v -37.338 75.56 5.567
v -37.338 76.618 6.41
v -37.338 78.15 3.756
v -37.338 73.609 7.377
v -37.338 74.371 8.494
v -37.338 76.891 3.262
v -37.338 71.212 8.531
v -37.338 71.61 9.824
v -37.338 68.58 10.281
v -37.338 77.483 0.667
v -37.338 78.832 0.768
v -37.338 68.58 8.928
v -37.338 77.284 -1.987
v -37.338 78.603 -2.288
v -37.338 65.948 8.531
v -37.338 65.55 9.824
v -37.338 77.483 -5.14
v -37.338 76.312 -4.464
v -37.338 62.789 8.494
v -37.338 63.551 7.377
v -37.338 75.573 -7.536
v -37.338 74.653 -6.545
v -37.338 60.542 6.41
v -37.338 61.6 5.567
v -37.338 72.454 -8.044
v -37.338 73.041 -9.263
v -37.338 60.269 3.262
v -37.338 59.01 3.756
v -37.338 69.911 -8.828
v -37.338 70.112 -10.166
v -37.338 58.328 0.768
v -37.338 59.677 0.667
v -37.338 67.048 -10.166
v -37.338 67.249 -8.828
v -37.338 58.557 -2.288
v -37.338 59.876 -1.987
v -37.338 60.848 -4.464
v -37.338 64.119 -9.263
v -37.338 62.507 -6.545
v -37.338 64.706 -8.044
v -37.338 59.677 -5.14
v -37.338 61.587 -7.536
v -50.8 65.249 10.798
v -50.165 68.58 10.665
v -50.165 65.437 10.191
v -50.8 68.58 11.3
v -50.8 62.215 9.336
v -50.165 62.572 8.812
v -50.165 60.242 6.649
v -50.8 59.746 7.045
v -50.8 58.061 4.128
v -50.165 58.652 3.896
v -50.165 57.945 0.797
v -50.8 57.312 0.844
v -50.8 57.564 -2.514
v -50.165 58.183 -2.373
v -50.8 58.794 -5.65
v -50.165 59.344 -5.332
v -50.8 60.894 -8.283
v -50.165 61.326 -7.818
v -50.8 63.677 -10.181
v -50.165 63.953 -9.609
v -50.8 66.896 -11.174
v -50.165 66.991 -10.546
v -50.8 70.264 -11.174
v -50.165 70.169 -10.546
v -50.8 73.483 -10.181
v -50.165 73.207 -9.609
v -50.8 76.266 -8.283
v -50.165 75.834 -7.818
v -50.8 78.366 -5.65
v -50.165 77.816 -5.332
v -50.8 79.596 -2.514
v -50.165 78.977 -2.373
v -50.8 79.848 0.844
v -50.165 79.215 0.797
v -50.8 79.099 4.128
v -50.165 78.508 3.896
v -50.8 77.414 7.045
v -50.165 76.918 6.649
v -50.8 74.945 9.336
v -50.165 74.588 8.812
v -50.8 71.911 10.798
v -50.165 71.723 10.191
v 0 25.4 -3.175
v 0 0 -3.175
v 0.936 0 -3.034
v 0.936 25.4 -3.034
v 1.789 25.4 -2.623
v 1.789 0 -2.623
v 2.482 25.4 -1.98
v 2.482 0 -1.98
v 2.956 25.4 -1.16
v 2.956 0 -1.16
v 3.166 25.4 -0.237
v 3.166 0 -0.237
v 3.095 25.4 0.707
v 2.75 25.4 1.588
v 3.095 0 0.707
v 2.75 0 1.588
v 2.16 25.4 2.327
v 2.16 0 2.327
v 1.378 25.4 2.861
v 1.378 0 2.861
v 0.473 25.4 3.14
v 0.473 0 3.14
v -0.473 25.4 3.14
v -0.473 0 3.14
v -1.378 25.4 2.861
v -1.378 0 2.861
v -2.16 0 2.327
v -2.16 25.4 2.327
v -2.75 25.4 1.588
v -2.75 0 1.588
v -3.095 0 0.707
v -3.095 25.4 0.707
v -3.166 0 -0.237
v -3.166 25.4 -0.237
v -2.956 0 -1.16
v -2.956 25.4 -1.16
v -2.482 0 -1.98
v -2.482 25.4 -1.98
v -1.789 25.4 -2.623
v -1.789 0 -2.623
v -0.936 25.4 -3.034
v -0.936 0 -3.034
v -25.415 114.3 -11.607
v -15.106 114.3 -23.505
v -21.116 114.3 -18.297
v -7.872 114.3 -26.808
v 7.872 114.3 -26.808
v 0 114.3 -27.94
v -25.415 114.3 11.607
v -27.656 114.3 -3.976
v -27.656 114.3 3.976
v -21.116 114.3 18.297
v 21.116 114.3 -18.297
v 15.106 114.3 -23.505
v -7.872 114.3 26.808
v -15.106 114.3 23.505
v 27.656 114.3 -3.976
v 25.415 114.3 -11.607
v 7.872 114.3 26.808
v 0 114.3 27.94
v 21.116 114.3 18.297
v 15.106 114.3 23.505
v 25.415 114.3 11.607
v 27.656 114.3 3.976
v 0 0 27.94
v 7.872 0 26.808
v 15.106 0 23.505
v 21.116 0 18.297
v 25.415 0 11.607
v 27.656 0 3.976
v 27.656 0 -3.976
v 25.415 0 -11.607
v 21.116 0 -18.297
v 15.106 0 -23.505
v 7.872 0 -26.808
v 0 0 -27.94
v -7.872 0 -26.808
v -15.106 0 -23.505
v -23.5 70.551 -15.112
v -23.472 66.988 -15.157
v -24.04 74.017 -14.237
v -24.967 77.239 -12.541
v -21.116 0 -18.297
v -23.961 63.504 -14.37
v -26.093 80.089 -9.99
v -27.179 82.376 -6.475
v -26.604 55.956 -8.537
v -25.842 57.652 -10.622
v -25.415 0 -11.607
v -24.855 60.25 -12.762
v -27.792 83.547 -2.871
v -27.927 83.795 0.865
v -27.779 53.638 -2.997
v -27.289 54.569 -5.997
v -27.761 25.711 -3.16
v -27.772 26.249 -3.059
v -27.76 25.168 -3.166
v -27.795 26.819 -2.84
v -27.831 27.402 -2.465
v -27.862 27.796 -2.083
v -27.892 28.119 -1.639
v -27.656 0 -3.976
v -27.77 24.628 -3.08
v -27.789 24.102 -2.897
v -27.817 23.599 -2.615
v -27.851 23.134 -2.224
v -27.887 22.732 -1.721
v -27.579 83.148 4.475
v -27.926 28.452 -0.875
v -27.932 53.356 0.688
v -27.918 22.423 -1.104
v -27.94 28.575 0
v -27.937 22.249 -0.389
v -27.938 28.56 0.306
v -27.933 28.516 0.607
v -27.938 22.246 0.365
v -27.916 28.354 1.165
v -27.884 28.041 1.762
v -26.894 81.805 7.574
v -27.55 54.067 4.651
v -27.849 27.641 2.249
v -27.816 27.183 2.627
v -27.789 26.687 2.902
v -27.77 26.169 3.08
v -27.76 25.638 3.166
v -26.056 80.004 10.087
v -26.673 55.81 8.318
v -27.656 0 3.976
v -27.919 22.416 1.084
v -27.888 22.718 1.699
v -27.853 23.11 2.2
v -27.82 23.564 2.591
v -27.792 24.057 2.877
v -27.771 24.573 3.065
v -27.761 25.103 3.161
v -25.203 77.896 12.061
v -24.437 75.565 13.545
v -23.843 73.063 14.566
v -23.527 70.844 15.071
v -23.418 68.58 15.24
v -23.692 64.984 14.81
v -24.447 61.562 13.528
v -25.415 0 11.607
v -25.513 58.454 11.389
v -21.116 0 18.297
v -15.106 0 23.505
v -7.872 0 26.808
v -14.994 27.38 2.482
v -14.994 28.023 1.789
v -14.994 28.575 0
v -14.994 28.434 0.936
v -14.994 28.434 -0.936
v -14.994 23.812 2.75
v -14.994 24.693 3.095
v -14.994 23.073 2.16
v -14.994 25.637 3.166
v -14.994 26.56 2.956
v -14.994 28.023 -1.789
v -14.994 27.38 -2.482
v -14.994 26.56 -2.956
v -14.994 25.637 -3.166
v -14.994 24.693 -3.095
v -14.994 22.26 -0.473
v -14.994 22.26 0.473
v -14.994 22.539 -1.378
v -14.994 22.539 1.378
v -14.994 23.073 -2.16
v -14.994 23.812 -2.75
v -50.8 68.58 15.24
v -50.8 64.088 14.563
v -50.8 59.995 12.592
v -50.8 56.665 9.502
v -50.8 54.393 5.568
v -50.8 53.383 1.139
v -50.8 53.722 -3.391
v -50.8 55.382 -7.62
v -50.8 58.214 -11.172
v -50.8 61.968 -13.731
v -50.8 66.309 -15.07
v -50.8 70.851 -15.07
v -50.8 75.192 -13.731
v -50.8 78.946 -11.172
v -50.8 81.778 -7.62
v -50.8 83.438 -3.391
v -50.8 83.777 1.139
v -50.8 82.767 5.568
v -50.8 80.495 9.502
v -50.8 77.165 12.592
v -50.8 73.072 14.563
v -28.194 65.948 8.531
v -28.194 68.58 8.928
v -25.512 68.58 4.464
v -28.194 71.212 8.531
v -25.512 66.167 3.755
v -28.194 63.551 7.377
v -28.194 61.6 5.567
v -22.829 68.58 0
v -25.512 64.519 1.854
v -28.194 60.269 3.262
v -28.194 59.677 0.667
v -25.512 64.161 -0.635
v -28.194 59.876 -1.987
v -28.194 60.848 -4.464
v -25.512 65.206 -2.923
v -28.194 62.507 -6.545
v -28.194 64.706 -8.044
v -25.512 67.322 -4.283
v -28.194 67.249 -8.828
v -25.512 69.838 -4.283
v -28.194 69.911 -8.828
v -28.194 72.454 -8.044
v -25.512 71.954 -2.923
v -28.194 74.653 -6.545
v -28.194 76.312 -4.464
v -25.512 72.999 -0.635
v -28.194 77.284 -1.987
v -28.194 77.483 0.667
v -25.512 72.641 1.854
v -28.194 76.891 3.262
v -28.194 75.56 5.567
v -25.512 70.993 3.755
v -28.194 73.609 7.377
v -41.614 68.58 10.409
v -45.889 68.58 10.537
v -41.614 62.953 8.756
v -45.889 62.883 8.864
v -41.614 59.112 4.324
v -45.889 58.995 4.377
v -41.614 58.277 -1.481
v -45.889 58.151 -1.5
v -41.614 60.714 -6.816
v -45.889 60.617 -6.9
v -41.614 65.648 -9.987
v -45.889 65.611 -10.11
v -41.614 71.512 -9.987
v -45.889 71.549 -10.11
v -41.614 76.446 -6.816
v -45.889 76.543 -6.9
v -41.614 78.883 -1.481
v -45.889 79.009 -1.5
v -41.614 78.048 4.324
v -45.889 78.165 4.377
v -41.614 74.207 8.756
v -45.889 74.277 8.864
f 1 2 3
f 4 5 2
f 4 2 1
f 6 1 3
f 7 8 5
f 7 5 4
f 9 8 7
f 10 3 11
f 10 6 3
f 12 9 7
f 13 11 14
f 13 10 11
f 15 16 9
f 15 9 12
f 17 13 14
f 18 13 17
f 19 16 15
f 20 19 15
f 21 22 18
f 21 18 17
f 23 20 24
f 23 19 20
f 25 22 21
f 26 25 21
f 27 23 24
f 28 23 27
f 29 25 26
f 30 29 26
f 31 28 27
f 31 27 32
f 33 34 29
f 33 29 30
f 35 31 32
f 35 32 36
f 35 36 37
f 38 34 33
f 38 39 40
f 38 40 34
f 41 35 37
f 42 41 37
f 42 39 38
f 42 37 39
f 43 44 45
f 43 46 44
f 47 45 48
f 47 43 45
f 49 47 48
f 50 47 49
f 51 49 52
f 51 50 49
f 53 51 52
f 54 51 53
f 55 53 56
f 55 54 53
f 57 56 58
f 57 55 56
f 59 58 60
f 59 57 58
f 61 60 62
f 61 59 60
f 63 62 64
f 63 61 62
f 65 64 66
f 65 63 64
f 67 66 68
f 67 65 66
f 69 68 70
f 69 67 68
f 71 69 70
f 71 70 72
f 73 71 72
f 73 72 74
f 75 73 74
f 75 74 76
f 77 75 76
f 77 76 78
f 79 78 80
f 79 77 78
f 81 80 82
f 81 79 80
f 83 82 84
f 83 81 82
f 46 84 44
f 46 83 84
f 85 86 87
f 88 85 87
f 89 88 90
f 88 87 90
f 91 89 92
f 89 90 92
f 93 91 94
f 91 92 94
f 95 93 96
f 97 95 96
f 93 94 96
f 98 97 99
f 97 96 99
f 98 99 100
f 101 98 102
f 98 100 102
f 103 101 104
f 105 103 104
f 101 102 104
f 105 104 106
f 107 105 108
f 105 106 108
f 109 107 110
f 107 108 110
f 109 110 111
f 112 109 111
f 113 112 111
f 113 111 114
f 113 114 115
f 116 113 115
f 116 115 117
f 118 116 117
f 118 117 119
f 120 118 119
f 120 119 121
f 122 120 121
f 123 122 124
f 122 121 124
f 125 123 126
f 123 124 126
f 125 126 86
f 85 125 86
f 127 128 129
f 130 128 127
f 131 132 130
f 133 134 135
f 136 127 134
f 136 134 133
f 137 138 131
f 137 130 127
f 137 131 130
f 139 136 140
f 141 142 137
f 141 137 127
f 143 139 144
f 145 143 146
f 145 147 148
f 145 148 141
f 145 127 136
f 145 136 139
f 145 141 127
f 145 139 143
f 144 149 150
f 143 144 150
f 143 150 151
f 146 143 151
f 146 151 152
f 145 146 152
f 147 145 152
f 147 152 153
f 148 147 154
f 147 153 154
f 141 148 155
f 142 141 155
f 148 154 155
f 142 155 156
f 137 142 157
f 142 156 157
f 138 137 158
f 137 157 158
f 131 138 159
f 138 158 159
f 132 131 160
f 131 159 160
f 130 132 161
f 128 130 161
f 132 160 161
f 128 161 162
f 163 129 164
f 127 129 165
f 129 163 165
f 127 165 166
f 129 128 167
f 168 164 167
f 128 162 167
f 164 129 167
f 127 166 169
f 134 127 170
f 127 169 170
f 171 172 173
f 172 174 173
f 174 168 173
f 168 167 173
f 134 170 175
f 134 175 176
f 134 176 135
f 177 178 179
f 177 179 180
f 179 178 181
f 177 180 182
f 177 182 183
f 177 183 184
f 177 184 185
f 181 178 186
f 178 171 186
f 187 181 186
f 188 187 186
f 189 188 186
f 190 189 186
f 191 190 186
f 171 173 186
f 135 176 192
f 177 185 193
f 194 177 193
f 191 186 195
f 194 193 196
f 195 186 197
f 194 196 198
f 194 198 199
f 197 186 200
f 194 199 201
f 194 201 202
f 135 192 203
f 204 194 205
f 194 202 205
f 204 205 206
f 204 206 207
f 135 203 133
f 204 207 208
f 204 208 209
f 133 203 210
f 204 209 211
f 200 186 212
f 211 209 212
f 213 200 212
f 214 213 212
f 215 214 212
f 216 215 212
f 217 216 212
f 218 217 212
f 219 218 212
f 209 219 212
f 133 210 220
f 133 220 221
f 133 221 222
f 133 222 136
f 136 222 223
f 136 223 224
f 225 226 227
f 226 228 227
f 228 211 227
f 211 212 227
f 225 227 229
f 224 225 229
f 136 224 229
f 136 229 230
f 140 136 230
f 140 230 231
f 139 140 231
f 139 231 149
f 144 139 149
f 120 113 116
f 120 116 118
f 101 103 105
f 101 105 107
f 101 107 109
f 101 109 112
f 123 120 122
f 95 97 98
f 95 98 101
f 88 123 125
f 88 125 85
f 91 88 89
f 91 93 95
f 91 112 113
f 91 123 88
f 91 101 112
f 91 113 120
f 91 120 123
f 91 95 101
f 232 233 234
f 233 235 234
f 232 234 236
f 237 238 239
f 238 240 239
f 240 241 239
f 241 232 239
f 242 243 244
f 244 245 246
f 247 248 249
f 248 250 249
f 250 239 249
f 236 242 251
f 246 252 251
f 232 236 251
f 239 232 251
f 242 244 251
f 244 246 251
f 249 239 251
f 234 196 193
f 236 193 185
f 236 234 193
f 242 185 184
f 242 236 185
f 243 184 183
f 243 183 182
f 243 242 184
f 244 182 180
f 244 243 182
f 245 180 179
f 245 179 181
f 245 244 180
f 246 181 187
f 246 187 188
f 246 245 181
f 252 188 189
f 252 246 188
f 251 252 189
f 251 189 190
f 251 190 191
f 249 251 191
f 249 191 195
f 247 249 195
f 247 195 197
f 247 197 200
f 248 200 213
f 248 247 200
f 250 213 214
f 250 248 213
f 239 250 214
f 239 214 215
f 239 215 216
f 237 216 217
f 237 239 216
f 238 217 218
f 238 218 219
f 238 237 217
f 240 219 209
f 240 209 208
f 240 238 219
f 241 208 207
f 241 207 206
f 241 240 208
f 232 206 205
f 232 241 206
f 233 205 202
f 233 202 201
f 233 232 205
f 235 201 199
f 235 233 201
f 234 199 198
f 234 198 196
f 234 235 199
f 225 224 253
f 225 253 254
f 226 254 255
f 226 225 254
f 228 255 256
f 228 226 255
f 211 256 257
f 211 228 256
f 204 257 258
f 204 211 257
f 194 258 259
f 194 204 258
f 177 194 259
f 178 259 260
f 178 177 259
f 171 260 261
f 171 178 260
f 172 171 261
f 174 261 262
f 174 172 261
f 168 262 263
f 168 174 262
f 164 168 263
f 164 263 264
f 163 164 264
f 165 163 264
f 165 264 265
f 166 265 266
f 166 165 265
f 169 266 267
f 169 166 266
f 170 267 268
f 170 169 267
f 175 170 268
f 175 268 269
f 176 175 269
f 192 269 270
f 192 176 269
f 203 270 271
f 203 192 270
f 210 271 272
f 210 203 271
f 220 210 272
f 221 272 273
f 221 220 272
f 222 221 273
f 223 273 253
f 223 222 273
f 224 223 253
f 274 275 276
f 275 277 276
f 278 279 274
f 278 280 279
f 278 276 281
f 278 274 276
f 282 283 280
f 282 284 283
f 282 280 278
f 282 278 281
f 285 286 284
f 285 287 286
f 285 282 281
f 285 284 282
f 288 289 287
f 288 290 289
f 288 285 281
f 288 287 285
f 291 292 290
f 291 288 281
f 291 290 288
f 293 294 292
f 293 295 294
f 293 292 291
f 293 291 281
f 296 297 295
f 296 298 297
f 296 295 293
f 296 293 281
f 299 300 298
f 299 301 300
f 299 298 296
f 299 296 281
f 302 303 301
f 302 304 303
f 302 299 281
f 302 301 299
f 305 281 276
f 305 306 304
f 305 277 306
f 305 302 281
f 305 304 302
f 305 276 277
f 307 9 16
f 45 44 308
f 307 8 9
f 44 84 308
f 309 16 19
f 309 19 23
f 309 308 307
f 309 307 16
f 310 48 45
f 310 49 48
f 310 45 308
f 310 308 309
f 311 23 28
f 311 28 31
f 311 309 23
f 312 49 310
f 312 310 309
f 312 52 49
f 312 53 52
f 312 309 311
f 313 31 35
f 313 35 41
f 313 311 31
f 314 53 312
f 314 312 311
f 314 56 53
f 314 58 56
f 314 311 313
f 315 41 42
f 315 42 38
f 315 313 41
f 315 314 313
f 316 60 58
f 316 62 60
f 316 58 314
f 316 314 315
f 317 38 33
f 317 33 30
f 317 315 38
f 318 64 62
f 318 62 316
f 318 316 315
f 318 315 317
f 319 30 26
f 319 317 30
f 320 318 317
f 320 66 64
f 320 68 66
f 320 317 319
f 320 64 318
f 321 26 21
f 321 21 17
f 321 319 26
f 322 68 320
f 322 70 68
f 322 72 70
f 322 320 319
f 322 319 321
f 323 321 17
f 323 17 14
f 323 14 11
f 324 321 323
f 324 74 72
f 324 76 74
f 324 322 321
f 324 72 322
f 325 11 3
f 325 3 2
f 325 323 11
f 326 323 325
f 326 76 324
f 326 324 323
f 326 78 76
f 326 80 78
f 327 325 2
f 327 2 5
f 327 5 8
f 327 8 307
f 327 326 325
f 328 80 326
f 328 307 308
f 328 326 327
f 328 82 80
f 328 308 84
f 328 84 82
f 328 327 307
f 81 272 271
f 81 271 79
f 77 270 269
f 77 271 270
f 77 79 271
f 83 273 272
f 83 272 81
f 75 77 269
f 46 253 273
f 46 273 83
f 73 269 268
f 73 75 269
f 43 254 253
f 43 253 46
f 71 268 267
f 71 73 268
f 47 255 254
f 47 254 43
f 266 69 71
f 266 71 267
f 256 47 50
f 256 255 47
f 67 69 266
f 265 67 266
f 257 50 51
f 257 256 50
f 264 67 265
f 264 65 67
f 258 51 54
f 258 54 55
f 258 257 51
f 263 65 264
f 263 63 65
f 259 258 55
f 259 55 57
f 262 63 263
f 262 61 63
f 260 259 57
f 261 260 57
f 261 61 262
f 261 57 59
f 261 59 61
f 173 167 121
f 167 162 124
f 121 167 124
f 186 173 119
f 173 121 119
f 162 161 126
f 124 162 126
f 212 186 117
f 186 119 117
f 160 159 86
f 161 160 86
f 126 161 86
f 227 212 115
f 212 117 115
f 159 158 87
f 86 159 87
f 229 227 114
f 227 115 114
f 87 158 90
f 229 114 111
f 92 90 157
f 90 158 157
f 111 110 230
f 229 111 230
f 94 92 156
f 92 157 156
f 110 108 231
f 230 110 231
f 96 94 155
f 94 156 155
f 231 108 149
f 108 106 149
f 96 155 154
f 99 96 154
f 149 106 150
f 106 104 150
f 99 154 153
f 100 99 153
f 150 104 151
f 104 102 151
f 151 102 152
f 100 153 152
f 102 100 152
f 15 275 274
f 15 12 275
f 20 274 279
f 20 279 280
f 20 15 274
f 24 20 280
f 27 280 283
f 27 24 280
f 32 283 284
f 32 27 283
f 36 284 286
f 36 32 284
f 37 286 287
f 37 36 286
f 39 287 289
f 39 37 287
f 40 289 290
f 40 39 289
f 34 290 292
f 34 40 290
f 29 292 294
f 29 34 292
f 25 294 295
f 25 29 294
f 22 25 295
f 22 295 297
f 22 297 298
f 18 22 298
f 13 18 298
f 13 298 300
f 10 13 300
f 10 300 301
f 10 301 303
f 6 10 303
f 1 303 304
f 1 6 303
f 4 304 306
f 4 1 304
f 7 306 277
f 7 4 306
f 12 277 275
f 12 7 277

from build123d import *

# Parameters (mm, degrees)
SKETCH1_R           = 27.94
BOSS_EXTRUDE1_DEPTH = 114.3
SKETCH2_W           = 28.65102891
SKETCH2_H           = 3.175
SKETCH3_R           = 3.175
OUTLET_DEPTH        = 25.4
SKETCH4_W           = 50.8
SKETCH4_H           = 15.24


with BuildPart() as part:
    # Sketch1 → Boss-Extrude1 (new body)
    with BuildSketch(Plane(origin=(0, 0, 0), x_dir=(1, 0, 0), z_dir=(0, 1, 0))):
        with Locations(Location((0, 0, 0), (0, 0, 270))):
            Circle(SKETCH1_R)
    extrude(amount=BOSS_EXTRUDE1_DEPTH)

    # Sketch2 → inlet (revolve, cut)
    with BuildSketch(Plane.XY):
        with Locations((-29.319058082, 26.9875)):
            Rectangle(SKETCH2_W, SKETCH2_H)
    revolve(axis=Axis((-14.993543627, 25.4, 0), (-1, 0, 0)), mode=Mode.SUBTRACT)

    # Sketch3 → outlet (cut)
    with BuildSketch(Plane.XZ):
        with Locations(Location((0, 0, 0), (0, 0, 270))):
            Circle(SKETCH3_R)
    extrude(amount=-OUTLET_DEPTH, mode=Mode.SUBTRACT)

    # Sketch4 → Revolve1 (revolve)
    with BuildSketch(Plane.XY, mode=Mode.PRIVATE) as revolve1_sk:
        with Locations((-25.4, 76.2)):
            Rectangle(SKETCH4_W, SKETCH4_H)
    revolve(revolve1_sk.sketch.rotate(Axis((-50.8, 68.58, 0), (1, 0, 0)), 90), axis=Axis((-50.8, 68.58, 0), (1, 0, 0)))

    # Sketch6 → 1/2 NPT Tapped Hole1 (revolve, cut)
    with BuildSketch(Plane(origin=(-50.8, 68.58, 0), x_dir=(0, 0, 1), z_dir=(0, 1, 0))):
        Polygon((0, 0), (0, 27.970543693), (8.9281, 22.606), (8.9281, 13.462), (10.280678542, 13.462), (10.6647361, 0.635), (11.2997361, 0), align=None)
    revolve(axis=Axis((-57.15, 68.58, 0), (1, 0, 0)), mode=Mode.SUBTRACT)


solid = part.part
